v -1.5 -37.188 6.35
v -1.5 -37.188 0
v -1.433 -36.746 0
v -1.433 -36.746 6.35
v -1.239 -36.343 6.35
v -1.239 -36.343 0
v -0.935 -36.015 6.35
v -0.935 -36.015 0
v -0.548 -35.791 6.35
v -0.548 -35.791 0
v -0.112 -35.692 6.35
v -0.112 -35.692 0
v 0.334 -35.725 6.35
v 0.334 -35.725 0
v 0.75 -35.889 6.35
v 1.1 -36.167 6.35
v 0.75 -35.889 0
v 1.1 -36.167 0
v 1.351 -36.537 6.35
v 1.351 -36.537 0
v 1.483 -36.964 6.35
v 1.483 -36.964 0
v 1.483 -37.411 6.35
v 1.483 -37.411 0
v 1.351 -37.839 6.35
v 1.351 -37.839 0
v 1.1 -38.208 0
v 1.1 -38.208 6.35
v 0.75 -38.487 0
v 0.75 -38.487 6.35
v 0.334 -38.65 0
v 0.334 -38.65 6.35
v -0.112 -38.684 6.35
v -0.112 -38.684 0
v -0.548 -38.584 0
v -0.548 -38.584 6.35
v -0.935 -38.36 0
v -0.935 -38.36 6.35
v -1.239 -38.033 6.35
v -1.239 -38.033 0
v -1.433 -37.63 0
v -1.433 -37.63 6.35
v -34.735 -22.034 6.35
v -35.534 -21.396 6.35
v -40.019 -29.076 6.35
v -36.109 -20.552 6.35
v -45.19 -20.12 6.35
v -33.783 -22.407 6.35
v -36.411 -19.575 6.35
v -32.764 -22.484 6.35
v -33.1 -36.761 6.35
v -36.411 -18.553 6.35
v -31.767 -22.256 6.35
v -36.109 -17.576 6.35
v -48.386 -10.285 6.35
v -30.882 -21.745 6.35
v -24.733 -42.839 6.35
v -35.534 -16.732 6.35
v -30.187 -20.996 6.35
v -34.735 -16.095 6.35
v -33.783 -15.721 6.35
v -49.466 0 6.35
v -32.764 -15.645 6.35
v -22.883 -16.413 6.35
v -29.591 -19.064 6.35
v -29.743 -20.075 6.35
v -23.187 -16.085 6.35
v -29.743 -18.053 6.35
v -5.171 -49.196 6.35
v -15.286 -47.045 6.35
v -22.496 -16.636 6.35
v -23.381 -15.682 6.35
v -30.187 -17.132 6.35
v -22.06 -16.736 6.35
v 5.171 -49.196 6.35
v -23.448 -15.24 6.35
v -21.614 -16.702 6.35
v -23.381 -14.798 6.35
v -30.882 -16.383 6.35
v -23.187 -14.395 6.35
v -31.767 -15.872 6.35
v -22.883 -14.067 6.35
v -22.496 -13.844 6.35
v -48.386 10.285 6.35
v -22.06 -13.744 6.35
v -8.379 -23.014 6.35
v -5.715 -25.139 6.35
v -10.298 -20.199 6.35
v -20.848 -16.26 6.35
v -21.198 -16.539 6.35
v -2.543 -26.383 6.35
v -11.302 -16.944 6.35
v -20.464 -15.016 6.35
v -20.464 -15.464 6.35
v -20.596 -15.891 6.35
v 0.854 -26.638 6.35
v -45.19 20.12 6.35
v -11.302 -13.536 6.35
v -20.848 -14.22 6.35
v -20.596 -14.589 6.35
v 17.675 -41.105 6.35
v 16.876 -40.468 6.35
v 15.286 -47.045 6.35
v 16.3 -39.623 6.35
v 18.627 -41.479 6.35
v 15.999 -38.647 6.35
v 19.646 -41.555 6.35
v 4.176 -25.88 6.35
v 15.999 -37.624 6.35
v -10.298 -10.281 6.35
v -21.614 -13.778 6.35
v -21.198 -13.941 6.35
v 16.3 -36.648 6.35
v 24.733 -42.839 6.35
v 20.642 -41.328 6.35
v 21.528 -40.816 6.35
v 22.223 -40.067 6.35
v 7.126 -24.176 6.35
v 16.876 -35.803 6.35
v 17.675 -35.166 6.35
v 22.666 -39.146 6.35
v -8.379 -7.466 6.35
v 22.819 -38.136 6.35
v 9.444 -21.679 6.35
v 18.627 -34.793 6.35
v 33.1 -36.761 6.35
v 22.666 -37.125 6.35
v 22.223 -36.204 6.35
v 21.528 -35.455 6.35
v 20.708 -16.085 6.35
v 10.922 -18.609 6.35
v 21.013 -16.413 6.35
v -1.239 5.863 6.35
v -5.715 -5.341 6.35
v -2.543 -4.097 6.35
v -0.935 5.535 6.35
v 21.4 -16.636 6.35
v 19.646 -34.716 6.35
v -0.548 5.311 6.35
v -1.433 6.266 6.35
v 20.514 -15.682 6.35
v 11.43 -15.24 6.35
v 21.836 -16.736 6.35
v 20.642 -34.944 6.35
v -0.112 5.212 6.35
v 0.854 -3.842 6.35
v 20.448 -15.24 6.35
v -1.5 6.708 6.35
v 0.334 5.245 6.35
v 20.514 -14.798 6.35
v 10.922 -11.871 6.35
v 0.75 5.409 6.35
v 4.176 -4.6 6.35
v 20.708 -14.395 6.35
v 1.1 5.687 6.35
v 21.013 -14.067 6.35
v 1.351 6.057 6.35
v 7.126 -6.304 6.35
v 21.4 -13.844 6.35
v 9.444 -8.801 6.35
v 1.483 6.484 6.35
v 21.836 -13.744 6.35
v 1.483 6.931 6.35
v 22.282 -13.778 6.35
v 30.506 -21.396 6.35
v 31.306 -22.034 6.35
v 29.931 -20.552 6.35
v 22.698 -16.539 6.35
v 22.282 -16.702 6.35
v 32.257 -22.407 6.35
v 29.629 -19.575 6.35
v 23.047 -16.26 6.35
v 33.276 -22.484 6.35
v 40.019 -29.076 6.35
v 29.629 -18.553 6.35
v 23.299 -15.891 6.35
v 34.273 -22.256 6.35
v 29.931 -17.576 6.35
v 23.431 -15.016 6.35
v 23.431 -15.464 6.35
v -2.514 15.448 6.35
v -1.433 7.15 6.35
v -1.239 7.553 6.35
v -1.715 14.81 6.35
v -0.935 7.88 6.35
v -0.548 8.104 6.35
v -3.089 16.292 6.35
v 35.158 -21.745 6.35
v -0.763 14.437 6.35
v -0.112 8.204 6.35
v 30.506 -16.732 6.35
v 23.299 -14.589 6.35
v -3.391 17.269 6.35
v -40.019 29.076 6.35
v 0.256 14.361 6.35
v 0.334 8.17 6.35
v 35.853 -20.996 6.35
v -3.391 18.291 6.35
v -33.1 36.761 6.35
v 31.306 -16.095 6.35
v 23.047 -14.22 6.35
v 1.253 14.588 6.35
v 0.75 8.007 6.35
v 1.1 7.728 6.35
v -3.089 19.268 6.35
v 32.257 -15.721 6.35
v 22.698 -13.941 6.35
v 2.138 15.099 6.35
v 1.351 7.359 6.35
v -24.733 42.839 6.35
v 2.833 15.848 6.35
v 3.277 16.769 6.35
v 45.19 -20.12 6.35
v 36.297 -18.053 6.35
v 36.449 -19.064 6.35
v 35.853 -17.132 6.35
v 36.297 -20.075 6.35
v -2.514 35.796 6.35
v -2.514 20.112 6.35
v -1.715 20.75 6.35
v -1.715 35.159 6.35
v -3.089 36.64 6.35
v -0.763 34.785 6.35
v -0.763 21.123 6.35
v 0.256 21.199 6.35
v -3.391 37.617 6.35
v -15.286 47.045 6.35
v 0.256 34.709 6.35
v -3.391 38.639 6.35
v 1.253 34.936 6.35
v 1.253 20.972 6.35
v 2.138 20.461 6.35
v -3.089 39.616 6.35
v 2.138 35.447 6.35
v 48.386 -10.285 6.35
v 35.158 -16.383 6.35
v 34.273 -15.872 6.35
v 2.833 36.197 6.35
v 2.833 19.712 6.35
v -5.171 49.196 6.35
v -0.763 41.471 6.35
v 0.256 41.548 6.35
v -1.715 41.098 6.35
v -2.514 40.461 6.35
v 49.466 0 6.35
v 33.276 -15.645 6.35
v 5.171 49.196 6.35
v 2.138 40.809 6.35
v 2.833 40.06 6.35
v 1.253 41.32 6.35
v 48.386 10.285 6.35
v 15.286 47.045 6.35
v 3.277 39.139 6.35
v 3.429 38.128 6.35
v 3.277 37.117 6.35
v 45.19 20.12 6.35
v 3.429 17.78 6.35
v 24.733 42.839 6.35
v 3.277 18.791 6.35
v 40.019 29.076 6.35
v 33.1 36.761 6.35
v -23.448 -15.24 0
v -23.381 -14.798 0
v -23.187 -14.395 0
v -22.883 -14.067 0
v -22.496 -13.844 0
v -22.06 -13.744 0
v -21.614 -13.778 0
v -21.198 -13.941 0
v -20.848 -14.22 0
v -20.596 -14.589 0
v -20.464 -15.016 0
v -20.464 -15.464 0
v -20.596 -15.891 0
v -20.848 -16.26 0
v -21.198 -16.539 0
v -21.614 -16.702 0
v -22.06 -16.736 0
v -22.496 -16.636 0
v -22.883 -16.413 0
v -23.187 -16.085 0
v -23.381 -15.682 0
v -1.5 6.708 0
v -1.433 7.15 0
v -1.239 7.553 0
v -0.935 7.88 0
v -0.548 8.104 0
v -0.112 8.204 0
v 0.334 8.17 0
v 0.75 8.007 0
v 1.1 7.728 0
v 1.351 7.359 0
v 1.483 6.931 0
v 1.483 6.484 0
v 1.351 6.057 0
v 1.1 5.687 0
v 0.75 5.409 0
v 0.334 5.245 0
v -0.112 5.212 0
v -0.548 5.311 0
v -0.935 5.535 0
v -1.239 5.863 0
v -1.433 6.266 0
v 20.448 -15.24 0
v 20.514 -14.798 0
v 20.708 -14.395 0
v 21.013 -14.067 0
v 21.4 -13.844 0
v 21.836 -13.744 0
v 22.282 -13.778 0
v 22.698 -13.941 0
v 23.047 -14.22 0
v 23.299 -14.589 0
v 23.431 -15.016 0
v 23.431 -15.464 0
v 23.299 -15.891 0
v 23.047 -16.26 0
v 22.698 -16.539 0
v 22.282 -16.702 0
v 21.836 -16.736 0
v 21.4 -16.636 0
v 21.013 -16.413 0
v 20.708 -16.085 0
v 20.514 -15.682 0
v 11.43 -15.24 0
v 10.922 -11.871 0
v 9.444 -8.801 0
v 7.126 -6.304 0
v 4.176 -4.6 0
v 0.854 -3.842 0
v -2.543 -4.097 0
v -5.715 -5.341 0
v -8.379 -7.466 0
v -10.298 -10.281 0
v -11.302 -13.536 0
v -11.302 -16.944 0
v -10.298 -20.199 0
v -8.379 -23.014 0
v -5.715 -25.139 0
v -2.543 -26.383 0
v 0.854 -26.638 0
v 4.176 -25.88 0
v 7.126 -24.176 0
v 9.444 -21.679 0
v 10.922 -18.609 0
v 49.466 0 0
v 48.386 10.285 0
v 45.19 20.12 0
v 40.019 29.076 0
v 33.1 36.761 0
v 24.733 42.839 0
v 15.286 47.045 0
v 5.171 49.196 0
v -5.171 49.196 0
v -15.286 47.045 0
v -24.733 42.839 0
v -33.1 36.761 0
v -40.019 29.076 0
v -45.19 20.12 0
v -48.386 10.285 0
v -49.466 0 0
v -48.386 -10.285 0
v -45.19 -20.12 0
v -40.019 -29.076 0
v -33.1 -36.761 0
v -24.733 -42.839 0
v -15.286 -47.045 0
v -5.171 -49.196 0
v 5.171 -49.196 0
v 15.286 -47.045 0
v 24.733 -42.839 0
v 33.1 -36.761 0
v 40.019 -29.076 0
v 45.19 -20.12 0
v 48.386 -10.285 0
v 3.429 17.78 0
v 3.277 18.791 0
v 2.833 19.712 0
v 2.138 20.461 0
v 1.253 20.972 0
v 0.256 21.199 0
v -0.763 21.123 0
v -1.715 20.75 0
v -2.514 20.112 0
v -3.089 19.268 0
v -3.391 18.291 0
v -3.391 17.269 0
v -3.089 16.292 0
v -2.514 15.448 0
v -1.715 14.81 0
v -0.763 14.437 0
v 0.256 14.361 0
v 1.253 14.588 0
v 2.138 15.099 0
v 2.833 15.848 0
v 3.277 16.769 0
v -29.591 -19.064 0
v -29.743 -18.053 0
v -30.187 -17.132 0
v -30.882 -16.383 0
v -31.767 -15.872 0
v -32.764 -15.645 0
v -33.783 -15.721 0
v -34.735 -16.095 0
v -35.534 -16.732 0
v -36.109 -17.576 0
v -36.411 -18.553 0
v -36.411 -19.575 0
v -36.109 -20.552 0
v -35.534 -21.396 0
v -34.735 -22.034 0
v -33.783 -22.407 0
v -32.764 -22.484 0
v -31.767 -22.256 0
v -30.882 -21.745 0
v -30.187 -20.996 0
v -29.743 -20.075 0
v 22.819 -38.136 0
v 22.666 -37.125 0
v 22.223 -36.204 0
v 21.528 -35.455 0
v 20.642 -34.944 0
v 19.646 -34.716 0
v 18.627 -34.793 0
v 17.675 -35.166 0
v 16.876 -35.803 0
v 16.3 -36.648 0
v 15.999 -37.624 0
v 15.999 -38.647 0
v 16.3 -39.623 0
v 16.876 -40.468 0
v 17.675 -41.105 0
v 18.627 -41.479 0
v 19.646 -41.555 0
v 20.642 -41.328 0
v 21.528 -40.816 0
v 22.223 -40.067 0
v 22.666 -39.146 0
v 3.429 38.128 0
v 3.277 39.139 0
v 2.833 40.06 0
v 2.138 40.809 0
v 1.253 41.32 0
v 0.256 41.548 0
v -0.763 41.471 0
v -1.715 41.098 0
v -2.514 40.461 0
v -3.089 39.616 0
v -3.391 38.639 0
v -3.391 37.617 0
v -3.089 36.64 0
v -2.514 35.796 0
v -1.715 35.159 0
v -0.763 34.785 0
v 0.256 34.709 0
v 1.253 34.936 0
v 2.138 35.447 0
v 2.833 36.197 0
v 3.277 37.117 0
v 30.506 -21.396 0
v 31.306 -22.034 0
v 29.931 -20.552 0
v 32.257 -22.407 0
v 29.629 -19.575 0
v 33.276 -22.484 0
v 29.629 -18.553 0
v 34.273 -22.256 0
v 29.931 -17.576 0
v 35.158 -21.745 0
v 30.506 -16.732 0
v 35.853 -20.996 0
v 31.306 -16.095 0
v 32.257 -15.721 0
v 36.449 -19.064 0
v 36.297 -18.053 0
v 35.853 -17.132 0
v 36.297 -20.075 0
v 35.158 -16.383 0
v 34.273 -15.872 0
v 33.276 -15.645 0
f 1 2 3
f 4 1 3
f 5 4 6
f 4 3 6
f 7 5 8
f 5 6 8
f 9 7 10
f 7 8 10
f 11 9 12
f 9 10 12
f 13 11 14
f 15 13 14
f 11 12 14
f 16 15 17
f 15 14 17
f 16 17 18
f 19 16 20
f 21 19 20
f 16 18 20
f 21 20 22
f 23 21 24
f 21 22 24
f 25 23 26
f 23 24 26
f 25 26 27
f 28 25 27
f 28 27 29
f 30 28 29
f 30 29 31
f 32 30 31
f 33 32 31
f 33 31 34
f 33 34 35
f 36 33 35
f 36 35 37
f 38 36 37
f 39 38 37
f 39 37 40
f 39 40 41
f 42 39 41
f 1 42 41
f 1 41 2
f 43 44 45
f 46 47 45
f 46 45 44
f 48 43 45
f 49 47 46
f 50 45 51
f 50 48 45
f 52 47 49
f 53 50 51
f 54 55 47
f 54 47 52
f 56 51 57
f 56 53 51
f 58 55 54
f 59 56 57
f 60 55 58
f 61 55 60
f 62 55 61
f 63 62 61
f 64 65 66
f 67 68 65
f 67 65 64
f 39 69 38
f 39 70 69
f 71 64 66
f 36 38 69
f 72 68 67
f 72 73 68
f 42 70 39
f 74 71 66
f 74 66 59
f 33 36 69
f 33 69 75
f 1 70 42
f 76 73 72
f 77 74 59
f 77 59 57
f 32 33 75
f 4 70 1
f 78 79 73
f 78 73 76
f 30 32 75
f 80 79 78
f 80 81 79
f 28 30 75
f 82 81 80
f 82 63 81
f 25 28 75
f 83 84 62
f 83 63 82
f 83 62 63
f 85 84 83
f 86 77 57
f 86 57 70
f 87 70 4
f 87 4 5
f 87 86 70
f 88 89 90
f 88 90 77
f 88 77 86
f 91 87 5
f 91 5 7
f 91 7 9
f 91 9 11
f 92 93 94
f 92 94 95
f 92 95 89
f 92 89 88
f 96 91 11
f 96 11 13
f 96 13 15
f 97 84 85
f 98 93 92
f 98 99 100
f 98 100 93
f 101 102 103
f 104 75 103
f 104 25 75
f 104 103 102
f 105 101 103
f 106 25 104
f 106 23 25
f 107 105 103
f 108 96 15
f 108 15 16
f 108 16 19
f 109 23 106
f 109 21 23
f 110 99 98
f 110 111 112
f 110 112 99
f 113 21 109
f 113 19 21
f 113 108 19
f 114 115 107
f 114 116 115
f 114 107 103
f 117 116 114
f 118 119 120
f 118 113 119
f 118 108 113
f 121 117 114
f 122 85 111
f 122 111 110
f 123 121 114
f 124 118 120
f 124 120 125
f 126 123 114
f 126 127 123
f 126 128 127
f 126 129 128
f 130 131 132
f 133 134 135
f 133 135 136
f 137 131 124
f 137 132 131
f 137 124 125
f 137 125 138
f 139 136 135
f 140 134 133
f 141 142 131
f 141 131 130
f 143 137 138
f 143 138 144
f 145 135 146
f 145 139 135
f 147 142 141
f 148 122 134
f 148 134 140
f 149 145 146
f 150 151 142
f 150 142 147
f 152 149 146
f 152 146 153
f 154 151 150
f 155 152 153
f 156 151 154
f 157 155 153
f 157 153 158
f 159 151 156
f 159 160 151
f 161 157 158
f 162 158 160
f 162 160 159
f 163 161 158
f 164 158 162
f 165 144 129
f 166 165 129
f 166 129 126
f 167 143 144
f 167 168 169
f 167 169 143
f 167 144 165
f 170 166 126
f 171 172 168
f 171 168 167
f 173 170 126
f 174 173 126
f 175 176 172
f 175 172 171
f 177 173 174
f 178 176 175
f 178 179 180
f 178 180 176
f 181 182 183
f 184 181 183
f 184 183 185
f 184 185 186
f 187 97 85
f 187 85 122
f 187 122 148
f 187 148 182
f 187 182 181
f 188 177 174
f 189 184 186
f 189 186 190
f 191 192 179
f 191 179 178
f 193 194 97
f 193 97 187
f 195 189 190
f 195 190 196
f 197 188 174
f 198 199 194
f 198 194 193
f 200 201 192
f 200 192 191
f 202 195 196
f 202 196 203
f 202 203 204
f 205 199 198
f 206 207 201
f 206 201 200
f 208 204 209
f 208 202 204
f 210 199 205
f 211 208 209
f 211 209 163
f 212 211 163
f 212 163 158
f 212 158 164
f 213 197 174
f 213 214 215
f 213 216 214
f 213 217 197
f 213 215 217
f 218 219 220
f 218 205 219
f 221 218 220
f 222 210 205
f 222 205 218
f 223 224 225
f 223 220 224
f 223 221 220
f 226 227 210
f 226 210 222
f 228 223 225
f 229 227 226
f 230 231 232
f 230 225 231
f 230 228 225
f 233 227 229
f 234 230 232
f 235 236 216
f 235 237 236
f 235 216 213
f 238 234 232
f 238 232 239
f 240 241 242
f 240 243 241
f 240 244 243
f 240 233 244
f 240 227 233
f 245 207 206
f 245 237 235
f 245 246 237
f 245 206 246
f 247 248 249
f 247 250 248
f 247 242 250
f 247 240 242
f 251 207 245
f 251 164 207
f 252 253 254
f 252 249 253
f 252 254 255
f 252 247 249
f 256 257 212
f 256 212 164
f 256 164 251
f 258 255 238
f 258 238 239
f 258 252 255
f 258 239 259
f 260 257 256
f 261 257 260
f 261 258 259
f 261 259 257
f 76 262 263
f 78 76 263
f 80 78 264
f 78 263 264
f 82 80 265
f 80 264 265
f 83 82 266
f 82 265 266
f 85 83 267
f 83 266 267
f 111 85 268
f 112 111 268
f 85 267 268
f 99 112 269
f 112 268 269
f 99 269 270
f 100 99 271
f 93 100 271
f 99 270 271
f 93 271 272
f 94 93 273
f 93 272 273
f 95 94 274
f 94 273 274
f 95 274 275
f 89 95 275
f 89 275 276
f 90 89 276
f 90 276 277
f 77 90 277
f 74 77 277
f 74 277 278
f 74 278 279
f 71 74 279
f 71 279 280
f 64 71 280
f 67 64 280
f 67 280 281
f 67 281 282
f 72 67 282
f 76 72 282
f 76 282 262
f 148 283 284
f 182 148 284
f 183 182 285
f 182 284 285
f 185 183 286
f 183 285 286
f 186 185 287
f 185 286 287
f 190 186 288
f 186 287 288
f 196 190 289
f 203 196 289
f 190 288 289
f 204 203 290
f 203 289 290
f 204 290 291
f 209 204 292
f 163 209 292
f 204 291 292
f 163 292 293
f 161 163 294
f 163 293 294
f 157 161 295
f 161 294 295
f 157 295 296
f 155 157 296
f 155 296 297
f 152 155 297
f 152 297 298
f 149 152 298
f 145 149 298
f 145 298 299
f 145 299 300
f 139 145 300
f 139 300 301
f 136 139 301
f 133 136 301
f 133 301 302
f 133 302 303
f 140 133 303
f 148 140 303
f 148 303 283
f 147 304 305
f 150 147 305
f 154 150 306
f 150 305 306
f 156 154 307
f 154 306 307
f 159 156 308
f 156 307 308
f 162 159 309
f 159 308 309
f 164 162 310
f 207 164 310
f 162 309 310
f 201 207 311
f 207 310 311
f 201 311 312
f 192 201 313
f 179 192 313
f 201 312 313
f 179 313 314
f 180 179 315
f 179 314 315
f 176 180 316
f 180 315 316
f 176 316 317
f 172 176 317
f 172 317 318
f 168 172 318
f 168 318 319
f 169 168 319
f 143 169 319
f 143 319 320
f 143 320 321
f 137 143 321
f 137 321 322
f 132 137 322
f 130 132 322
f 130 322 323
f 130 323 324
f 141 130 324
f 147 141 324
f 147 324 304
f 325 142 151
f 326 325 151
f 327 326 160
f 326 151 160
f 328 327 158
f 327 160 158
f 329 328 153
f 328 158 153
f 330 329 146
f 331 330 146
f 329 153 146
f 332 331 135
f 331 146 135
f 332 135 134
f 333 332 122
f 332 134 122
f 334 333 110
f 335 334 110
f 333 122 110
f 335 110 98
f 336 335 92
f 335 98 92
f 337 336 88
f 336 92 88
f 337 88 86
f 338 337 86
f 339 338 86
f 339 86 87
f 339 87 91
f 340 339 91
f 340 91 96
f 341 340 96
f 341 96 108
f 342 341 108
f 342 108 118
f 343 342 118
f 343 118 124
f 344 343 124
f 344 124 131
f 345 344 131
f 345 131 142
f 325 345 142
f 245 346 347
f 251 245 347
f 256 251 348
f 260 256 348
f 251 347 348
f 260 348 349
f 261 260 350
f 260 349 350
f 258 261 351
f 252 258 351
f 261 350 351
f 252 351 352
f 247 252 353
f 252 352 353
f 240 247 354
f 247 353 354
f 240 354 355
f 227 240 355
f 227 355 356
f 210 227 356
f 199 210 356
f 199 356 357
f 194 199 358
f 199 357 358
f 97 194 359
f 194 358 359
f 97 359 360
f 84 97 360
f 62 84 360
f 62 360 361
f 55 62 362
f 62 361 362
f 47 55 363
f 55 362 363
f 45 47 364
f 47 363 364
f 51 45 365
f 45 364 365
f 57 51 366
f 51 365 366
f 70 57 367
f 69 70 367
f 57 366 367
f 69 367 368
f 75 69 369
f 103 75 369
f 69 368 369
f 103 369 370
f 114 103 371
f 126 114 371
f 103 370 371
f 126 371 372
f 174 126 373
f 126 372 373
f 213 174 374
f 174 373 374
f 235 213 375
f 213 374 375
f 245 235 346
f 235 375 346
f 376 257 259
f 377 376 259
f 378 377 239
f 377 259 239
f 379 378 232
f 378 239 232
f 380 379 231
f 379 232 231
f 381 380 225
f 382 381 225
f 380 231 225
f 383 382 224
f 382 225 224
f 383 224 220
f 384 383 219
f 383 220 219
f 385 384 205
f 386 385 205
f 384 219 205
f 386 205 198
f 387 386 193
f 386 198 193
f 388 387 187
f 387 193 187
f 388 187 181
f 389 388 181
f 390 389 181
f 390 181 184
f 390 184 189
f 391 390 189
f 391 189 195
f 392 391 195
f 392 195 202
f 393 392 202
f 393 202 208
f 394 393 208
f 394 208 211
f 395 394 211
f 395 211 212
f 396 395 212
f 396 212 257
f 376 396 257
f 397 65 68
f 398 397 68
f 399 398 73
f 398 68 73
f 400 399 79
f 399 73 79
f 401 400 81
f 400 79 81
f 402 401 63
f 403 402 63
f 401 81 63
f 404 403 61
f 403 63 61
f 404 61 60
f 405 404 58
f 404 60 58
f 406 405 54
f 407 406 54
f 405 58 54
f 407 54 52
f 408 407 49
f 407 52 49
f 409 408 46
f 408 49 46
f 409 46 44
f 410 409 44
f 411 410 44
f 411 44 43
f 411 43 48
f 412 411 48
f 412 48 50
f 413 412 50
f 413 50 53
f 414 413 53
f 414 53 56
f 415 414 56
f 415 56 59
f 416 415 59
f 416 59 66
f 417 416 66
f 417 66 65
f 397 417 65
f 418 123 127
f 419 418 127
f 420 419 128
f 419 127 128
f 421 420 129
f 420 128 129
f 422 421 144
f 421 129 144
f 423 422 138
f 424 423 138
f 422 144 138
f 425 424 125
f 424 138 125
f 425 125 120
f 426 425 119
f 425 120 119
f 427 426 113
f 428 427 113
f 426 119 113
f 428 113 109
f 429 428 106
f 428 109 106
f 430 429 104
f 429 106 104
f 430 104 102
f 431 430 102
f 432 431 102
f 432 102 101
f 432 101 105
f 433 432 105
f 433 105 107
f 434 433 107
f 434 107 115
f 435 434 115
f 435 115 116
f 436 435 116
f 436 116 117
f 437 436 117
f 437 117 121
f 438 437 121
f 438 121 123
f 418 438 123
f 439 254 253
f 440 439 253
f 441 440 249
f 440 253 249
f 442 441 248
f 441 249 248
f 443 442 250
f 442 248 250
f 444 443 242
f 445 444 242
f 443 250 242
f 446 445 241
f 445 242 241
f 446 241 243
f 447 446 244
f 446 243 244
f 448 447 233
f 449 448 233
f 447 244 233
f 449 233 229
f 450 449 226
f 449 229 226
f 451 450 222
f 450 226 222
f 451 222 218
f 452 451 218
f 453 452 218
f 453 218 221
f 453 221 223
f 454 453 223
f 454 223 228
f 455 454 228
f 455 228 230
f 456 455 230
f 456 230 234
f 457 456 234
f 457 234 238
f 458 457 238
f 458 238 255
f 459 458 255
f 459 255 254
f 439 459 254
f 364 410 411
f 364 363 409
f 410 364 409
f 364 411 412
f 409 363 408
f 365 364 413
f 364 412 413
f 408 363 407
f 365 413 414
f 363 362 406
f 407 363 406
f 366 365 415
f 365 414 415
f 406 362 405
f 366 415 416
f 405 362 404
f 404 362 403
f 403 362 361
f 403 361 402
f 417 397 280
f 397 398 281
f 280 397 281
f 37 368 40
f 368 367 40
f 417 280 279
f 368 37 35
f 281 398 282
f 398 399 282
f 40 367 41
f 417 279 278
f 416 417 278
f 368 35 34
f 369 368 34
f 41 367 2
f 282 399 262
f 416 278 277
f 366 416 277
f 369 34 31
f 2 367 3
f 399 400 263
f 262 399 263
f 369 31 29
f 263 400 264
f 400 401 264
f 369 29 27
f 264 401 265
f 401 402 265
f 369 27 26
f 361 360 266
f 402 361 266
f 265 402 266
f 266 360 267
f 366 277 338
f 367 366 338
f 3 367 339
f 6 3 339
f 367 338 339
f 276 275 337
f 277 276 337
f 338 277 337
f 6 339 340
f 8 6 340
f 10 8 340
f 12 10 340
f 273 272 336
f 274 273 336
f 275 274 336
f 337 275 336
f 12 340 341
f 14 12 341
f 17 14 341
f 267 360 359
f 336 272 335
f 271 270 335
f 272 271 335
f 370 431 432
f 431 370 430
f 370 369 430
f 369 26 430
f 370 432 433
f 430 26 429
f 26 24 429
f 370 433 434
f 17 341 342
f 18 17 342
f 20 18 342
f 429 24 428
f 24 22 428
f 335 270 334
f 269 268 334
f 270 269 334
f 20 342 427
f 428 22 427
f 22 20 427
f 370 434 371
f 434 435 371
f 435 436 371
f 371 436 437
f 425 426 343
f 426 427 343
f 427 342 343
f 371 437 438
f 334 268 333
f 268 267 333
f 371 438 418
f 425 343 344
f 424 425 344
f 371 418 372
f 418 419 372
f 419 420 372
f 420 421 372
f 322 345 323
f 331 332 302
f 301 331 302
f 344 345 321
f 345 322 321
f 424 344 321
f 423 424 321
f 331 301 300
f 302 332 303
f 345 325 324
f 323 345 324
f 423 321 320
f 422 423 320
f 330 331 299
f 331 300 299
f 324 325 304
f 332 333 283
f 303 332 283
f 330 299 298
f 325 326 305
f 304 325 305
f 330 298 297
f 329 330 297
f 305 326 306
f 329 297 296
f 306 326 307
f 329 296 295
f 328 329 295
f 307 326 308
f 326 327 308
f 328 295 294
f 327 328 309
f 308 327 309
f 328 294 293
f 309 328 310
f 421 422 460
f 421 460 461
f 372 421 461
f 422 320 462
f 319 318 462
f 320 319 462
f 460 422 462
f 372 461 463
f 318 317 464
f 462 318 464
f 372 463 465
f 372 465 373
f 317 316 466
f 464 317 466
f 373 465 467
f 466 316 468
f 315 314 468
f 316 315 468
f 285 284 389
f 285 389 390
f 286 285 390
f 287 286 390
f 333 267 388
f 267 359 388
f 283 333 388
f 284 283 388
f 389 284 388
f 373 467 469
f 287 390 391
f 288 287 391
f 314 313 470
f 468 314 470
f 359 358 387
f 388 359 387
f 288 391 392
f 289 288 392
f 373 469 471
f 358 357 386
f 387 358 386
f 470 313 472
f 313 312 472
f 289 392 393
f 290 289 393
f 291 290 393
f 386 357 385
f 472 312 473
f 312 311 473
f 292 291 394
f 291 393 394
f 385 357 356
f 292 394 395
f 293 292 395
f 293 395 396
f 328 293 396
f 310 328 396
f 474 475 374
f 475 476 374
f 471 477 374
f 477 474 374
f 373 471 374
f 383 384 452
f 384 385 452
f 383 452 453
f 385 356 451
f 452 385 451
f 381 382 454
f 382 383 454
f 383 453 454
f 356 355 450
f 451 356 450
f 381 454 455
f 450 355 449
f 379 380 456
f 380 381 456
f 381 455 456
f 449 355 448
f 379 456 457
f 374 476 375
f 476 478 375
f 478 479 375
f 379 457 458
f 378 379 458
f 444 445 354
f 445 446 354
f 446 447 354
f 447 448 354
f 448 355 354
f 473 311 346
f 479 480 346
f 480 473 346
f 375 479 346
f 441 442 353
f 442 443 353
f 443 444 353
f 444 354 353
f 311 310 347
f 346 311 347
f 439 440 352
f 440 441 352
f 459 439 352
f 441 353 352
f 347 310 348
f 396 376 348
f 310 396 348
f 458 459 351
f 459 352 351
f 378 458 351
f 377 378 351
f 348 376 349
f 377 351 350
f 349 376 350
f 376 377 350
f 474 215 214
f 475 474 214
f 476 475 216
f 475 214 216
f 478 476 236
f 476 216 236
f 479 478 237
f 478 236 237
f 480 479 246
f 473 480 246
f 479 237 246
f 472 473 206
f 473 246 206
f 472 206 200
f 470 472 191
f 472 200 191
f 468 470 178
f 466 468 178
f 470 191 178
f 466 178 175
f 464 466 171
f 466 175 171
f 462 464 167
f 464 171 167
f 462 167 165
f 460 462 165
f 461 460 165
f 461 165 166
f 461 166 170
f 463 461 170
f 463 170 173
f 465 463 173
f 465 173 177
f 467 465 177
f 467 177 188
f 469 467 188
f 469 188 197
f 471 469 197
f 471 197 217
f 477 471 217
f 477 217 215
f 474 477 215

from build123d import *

# Parameters (mm, degrees)
SKETCH1_R                        = 49.4665
BOSS_EXTRUDE1_DEPTH              = 6.35
M3_SCREW_HOLE_3_0MM_DOWEL_HOLE_D = 3
SKETCH6_R                        = 3.429
CUT_EXTRUDE2_DEPTH               = 7.35
SKETCH7_R                        = 11.43
CUT_EXTRUDE3_DEPTH               = 7.35
SKETCH5_R                        = 3.429
CUT_EXTRUDE4_DEPTH               = 7.35
SKETCH11_R                       = 3.429
CUT_EXTRUDE7_DEPTH               = 7.35


with BuildPart() as part:
    # Sketch1 → Boss-Extrude1 (new body)
    with BuildSketch(Plane.XY):
        Circle(SKETCH1_R)
    extrude(amount=BOSS_EXTRUDE1_DEPTH)

    # M3 Screw Hole - Ø3.0mm Dowel Hole (through all)
    with Locations(Plane.XY.offset(6.35)):
        with Locations((0, 6.70774596), (-21.94774596, -15.24), (0, -37.18774596), (21.94774596, -15.24)):
            Hole(M3_SCREW_HOLE_3_0MM_DOWEL_HOLE_D / 2)

    # Sketch6 → Cut-Extrude2 (cut, through all)
    with BuildSketch(Plane.XY.offset(6.35)):
        with Locations((0, 38.128211777)):
            Circle(SKETCH6_R)
        with Locations((-33.02, -19.064105889)):
            Circle(SKETCH6_R)
        with Locations((33.02, -19.064105889)):
            Circle(SKETCH6_R)
    extrude(amount=-CUT_EXTRUDE2_DEPTH, mode=Mode.SUBTRACT)

    # Sketch7 → Cut-Extrude3 (cut, through all)
    with BuildSketch(Plane.XY.offset(6.35)):
        with Locations((0, -15.24)):
            Circle(SKETCH7_R)
    extrude(amount=-CUT_EXTRUDE3_DEPTH, mode=Mode.SUBTRACT)

    # Sketch5 → Cut-Extrude4 (cut, through all)
    with BuildSketch(Plane.XY.offset(6.35)):
        with Locations((0, 17.78)):
            Circle(SKETCH5_R)
    extrude(amount=-CUT_EXTRUDE4_DEPTH, mode=Mode.SUBTRACT)

    # Sketch11 → Cut-Extrude7 (cut, through all)
    with BuildSketch(Plane.XY.offset(6.35)):
        with Locations((19.38971276, -38.135544915)):
            Circle(SKETCH11_R)
    extrude(amount=-CUT_EXTRUDE7_DEPTH, mode=Mode.SUBTRACT)


solid = part.part
